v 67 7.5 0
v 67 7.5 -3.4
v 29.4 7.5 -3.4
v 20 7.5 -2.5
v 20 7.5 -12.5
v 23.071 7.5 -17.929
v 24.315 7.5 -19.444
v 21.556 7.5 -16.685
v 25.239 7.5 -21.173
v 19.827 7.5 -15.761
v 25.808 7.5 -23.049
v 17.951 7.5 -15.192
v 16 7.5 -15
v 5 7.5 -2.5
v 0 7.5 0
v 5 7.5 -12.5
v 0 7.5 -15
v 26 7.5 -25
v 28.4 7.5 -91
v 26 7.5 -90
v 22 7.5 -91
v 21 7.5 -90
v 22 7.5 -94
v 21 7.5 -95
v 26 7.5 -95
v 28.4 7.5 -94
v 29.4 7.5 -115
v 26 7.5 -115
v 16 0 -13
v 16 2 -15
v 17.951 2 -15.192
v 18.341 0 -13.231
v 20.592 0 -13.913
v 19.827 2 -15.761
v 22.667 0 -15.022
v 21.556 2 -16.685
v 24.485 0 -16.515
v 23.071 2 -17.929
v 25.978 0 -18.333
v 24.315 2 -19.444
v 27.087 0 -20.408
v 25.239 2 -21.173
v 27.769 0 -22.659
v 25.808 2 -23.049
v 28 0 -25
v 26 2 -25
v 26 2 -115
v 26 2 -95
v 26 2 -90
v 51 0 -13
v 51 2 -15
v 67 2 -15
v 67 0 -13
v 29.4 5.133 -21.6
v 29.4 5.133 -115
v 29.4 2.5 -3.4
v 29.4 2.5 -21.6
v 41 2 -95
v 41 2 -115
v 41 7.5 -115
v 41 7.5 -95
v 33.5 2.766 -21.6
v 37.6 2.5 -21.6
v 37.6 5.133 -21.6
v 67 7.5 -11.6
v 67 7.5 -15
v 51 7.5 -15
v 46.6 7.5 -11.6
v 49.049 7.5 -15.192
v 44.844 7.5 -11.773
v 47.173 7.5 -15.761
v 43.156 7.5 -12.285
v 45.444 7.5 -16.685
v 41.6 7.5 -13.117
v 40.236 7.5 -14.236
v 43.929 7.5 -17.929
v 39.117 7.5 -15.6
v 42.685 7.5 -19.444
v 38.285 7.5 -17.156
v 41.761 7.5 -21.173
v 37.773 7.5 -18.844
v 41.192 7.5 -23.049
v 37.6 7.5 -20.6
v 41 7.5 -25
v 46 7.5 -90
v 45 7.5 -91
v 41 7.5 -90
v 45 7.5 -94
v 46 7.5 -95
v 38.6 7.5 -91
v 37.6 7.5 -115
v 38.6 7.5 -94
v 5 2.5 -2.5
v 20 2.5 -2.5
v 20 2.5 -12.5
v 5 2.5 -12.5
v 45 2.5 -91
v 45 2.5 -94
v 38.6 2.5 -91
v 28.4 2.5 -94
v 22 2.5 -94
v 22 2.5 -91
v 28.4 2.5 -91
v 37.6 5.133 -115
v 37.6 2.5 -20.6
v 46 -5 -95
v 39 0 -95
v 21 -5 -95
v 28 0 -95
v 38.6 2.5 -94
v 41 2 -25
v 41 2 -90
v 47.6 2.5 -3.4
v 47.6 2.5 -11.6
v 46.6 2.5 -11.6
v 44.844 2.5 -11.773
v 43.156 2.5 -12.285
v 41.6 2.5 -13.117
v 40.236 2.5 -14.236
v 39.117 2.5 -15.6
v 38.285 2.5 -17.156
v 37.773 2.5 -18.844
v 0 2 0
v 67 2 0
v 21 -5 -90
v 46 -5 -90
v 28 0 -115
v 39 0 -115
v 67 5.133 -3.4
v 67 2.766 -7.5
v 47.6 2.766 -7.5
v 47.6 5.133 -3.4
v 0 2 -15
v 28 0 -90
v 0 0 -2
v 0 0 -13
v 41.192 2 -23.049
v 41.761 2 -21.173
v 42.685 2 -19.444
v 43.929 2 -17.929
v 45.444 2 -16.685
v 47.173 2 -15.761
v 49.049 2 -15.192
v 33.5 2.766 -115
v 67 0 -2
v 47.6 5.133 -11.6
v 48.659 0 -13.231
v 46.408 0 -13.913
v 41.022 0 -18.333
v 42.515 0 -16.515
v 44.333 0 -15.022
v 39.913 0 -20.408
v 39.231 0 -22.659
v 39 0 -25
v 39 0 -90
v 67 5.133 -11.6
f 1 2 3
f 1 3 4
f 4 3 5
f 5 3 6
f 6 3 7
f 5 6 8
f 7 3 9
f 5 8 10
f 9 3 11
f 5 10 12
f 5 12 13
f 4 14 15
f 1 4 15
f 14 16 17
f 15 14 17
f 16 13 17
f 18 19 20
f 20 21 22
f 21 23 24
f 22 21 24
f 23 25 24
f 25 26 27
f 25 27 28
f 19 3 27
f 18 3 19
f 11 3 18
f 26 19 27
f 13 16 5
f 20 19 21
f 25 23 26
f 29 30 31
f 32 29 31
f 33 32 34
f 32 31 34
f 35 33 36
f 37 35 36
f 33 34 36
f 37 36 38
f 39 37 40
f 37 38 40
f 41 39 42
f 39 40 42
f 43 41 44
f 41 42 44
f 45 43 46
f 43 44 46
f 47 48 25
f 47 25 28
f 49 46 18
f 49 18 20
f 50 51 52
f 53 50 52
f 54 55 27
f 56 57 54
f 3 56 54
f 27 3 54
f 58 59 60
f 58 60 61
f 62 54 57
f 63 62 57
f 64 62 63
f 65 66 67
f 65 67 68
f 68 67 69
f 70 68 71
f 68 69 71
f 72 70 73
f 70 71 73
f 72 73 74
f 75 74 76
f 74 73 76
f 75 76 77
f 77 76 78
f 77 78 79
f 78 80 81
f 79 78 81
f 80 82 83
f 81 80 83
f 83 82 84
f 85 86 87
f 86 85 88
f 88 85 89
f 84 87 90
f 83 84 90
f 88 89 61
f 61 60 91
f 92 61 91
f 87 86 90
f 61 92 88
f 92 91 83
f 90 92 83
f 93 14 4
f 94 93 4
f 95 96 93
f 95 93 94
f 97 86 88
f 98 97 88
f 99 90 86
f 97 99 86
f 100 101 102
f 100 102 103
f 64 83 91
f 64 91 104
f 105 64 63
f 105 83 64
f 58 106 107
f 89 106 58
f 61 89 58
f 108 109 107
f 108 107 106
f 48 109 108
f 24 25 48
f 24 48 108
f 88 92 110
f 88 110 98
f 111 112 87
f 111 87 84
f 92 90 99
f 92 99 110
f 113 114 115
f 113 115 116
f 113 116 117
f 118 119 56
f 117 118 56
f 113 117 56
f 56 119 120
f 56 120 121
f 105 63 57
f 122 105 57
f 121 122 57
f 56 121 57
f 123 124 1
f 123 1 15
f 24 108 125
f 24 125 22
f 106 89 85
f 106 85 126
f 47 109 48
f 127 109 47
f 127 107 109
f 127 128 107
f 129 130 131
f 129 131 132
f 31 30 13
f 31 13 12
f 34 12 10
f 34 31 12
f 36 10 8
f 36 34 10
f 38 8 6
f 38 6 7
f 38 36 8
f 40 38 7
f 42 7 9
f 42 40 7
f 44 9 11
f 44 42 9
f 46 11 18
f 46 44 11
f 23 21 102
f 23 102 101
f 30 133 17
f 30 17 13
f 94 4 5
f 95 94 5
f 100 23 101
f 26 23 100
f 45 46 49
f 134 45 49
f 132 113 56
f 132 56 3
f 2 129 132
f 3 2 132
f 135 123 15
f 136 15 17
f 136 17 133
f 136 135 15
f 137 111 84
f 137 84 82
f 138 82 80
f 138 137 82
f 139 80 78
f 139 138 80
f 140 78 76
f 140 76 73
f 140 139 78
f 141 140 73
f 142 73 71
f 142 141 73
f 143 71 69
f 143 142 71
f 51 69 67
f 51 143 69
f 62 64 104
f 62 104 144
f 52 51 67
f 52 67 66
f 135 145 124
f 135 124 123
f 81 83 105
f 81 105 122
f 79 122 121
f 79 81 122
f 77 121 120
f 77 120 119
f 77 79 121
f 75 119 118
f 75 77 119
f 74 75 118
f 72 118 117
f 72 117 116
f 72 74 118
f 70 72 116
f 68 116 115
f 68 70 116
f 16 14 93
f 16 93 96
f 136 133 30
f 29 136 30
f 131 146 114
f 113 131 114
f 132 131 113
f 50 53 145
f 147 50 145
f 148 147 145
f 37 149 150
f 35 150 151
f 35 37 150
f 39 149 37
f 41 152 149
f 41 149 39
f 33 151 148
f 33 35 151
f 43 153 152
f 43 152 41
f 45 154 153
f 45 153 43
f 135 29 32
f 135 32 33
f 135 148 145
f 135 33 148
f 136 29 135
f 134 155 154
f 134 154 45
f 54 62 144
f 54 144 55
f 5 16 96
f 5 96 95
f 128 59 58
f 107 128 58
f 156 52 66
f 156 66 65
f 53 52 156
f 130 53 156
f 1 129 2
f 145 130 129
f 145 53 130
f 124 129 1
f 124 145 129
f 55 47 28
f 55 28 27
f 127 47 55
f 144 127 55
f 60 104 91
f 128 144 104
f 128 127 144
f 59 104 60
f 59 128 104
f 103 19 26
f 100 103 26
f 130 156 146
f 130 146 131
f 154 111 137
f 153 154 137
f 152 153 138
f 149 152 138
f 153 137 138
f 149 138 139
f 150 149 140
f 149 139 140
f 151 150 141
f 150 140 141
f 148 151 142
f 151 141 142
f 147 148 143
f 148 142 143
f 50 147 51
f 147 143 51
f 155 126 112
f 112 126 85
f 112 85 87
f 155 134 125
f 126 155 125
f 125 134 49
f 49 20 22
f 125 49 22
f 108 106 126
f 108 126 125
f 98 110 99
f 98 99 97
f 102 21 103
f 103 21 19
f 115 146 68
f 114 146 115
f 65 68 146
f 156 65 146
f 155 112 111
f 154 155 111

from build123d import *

# Parameters (mm, degrees)
BOSS_EXTRUDE1_DEPTH = 7.5
CUT_EXTRUDE6_DEPTH  = 5
BOSS_EXTRUDE2_START = -20
BOSS_EXTRUDE2_DEPTH = 5
CHAMFER1_SIZE       = 2
SKETCH11_W          = 15
SKETCH11_H          = 10
SKETCH11_W_2        = 6.4
SKETCH11_H_2        = 3
CUT_EXTRUDE7_DEPTH  = 5


with BuildPart() as part:
    # Sketch1 → Boss-Extrude1 (new body)
    with BuildSketch(Plane(origin=(0, 0, 0), x_dir=(1, 0, 0), z_dir=(0, 1, 0))):
        with BuildLine():
            Line((0, 0), (0, 15))
            Line((0, 15), (16, 15))
            ThreePointArc((16, 15), (23.071067812, 17.928932188), (26, 25))
            Line((26, 25), (26, 115))
            Line((26, 115), (41, 115))
            Line((41, 115), (41, 25))
            ThreePointArc((41, 25), (43.928932188, 17.928932188), (51, 15))
            Line((51, 15), (67, 15))
            Line((67, 15), (67, 0))
            Line((67, 0), (0, 0))
        make_face()
    extrude(amount=BOSS_EXTRUDE1_DEPTH)

    # Cut-Sweep1: sweep along a path in Sketch2
    with BuildLine(Plane(origin=(0, 7.5, 0), x_dir=(1, 0, 0), z_dir=(0, 1, 0))) as cut_sweep1_path:
        Line((33.5, 115), (33.5, 7.5))
        Line((33.5, 7.5), (67, 7.5))
    # Sketch3 → Cut-Sweep1 (sweep, cut)
    with BuildSketch(Plane(origin=(0, 0, -115), x_dir=(-1, 0, 0), z_dir=(0, 0, -1))):
        Polygon((-37.6, 5.132863896), (-33.5, 2.765727793), (-29.4, 5.132863896), (-29.4, 9.867136104), (-33.5, 12.234272207), (-37.6, 9.867136104), align=None)
    sweep(path=cut_sweep1_path.line, transition=Transition.RIGHT, mode=Mode.SUBTRACT)

    # Sketch7 → Cut-Extrude6 (cut)
    with BuildSketch(Plane(origin=(0, 7.5, 0), x_dir=(1, 0, 0), z_dir=(0, 1, 0))):
        with BuildLine():
            Line((47.6, 11.6), (47.6, 3.4))
            Line((47.6, 3.4), (29.4, 3.4))
            Line((29.4, 3.4), (29.4, 21.6))
            Line((29.4, 21.6), (37.6, 21.6))
            Line((37.6, 21.6), (37.6, 20.6))
            ThreePointArc((37.6, 20.6), (40.236038969, 14.236038969), (46.6, 11.6))
            Line((46.6, 11.6), (47.6, 11.6))
        make_face()
    extrude(amount=-CUT_EXTRUDE6_DEPTH, mode=Mode.SUBTRACT)

    # Sketch10 → Boss-Extrude2 (add)
    with BuildSketch(Plane(origin=(0, 0, -115), x_dir=(-1, 0, 0), z_dir=(0, 0, -1)).offset(BOSS_EXTRUDE2_START)):
        Polygon((-41, 7.5), (-46, 7.5), (-46, -5), (-21, -5), (-21, 7.5), (-26, 7.5), (-26, 0), (-41, 0), align=None)
    extrude(amount=-BOSS_EXTRUDE2_DEPTH)

    # Chamfer1
    chamfer1_edges = [part.edges().sort_by_distance(p)[0] for p in [
        (26, 0, -57.5),
        (41, 0, -105),
        (33.5, 0, 0),
        (8, 0, -15),
        (23.071067812, 0, -17.928932188),
        (26, 0, -105),
        (41, 0, -57.5),
        (43.928932188, 0, -17.928932188),
        (59, 0, -15),
    ]]
    chamfer(chamfer1_edges, length=CHAMFER1_SIZE)

    # Sketch11 → Cut-Extrude7 (cut)
    with BuildSketch(Plane(origin=(0, 7.5, 0), x_dir=(1, 0, 0), z_dir=(0, 1, 0))):
        with Locations((12.5, 7.5)):
            Rectangle(SKETCH11_W, SKETCH11_H)
        with Locations((25.2, 92.5)):
            Rectangle(SKETCH11_W_2, SKETCH11_H_2)
        with Locations((41.8, 92.5)):
            Rectangle(SKETCH11_W_2, SKETCH11_H_2)
    extrude(amount=-CUT_EXTRUDE7_DEPTH, mode=Mode.SUBTRACT)


solid = part.part
